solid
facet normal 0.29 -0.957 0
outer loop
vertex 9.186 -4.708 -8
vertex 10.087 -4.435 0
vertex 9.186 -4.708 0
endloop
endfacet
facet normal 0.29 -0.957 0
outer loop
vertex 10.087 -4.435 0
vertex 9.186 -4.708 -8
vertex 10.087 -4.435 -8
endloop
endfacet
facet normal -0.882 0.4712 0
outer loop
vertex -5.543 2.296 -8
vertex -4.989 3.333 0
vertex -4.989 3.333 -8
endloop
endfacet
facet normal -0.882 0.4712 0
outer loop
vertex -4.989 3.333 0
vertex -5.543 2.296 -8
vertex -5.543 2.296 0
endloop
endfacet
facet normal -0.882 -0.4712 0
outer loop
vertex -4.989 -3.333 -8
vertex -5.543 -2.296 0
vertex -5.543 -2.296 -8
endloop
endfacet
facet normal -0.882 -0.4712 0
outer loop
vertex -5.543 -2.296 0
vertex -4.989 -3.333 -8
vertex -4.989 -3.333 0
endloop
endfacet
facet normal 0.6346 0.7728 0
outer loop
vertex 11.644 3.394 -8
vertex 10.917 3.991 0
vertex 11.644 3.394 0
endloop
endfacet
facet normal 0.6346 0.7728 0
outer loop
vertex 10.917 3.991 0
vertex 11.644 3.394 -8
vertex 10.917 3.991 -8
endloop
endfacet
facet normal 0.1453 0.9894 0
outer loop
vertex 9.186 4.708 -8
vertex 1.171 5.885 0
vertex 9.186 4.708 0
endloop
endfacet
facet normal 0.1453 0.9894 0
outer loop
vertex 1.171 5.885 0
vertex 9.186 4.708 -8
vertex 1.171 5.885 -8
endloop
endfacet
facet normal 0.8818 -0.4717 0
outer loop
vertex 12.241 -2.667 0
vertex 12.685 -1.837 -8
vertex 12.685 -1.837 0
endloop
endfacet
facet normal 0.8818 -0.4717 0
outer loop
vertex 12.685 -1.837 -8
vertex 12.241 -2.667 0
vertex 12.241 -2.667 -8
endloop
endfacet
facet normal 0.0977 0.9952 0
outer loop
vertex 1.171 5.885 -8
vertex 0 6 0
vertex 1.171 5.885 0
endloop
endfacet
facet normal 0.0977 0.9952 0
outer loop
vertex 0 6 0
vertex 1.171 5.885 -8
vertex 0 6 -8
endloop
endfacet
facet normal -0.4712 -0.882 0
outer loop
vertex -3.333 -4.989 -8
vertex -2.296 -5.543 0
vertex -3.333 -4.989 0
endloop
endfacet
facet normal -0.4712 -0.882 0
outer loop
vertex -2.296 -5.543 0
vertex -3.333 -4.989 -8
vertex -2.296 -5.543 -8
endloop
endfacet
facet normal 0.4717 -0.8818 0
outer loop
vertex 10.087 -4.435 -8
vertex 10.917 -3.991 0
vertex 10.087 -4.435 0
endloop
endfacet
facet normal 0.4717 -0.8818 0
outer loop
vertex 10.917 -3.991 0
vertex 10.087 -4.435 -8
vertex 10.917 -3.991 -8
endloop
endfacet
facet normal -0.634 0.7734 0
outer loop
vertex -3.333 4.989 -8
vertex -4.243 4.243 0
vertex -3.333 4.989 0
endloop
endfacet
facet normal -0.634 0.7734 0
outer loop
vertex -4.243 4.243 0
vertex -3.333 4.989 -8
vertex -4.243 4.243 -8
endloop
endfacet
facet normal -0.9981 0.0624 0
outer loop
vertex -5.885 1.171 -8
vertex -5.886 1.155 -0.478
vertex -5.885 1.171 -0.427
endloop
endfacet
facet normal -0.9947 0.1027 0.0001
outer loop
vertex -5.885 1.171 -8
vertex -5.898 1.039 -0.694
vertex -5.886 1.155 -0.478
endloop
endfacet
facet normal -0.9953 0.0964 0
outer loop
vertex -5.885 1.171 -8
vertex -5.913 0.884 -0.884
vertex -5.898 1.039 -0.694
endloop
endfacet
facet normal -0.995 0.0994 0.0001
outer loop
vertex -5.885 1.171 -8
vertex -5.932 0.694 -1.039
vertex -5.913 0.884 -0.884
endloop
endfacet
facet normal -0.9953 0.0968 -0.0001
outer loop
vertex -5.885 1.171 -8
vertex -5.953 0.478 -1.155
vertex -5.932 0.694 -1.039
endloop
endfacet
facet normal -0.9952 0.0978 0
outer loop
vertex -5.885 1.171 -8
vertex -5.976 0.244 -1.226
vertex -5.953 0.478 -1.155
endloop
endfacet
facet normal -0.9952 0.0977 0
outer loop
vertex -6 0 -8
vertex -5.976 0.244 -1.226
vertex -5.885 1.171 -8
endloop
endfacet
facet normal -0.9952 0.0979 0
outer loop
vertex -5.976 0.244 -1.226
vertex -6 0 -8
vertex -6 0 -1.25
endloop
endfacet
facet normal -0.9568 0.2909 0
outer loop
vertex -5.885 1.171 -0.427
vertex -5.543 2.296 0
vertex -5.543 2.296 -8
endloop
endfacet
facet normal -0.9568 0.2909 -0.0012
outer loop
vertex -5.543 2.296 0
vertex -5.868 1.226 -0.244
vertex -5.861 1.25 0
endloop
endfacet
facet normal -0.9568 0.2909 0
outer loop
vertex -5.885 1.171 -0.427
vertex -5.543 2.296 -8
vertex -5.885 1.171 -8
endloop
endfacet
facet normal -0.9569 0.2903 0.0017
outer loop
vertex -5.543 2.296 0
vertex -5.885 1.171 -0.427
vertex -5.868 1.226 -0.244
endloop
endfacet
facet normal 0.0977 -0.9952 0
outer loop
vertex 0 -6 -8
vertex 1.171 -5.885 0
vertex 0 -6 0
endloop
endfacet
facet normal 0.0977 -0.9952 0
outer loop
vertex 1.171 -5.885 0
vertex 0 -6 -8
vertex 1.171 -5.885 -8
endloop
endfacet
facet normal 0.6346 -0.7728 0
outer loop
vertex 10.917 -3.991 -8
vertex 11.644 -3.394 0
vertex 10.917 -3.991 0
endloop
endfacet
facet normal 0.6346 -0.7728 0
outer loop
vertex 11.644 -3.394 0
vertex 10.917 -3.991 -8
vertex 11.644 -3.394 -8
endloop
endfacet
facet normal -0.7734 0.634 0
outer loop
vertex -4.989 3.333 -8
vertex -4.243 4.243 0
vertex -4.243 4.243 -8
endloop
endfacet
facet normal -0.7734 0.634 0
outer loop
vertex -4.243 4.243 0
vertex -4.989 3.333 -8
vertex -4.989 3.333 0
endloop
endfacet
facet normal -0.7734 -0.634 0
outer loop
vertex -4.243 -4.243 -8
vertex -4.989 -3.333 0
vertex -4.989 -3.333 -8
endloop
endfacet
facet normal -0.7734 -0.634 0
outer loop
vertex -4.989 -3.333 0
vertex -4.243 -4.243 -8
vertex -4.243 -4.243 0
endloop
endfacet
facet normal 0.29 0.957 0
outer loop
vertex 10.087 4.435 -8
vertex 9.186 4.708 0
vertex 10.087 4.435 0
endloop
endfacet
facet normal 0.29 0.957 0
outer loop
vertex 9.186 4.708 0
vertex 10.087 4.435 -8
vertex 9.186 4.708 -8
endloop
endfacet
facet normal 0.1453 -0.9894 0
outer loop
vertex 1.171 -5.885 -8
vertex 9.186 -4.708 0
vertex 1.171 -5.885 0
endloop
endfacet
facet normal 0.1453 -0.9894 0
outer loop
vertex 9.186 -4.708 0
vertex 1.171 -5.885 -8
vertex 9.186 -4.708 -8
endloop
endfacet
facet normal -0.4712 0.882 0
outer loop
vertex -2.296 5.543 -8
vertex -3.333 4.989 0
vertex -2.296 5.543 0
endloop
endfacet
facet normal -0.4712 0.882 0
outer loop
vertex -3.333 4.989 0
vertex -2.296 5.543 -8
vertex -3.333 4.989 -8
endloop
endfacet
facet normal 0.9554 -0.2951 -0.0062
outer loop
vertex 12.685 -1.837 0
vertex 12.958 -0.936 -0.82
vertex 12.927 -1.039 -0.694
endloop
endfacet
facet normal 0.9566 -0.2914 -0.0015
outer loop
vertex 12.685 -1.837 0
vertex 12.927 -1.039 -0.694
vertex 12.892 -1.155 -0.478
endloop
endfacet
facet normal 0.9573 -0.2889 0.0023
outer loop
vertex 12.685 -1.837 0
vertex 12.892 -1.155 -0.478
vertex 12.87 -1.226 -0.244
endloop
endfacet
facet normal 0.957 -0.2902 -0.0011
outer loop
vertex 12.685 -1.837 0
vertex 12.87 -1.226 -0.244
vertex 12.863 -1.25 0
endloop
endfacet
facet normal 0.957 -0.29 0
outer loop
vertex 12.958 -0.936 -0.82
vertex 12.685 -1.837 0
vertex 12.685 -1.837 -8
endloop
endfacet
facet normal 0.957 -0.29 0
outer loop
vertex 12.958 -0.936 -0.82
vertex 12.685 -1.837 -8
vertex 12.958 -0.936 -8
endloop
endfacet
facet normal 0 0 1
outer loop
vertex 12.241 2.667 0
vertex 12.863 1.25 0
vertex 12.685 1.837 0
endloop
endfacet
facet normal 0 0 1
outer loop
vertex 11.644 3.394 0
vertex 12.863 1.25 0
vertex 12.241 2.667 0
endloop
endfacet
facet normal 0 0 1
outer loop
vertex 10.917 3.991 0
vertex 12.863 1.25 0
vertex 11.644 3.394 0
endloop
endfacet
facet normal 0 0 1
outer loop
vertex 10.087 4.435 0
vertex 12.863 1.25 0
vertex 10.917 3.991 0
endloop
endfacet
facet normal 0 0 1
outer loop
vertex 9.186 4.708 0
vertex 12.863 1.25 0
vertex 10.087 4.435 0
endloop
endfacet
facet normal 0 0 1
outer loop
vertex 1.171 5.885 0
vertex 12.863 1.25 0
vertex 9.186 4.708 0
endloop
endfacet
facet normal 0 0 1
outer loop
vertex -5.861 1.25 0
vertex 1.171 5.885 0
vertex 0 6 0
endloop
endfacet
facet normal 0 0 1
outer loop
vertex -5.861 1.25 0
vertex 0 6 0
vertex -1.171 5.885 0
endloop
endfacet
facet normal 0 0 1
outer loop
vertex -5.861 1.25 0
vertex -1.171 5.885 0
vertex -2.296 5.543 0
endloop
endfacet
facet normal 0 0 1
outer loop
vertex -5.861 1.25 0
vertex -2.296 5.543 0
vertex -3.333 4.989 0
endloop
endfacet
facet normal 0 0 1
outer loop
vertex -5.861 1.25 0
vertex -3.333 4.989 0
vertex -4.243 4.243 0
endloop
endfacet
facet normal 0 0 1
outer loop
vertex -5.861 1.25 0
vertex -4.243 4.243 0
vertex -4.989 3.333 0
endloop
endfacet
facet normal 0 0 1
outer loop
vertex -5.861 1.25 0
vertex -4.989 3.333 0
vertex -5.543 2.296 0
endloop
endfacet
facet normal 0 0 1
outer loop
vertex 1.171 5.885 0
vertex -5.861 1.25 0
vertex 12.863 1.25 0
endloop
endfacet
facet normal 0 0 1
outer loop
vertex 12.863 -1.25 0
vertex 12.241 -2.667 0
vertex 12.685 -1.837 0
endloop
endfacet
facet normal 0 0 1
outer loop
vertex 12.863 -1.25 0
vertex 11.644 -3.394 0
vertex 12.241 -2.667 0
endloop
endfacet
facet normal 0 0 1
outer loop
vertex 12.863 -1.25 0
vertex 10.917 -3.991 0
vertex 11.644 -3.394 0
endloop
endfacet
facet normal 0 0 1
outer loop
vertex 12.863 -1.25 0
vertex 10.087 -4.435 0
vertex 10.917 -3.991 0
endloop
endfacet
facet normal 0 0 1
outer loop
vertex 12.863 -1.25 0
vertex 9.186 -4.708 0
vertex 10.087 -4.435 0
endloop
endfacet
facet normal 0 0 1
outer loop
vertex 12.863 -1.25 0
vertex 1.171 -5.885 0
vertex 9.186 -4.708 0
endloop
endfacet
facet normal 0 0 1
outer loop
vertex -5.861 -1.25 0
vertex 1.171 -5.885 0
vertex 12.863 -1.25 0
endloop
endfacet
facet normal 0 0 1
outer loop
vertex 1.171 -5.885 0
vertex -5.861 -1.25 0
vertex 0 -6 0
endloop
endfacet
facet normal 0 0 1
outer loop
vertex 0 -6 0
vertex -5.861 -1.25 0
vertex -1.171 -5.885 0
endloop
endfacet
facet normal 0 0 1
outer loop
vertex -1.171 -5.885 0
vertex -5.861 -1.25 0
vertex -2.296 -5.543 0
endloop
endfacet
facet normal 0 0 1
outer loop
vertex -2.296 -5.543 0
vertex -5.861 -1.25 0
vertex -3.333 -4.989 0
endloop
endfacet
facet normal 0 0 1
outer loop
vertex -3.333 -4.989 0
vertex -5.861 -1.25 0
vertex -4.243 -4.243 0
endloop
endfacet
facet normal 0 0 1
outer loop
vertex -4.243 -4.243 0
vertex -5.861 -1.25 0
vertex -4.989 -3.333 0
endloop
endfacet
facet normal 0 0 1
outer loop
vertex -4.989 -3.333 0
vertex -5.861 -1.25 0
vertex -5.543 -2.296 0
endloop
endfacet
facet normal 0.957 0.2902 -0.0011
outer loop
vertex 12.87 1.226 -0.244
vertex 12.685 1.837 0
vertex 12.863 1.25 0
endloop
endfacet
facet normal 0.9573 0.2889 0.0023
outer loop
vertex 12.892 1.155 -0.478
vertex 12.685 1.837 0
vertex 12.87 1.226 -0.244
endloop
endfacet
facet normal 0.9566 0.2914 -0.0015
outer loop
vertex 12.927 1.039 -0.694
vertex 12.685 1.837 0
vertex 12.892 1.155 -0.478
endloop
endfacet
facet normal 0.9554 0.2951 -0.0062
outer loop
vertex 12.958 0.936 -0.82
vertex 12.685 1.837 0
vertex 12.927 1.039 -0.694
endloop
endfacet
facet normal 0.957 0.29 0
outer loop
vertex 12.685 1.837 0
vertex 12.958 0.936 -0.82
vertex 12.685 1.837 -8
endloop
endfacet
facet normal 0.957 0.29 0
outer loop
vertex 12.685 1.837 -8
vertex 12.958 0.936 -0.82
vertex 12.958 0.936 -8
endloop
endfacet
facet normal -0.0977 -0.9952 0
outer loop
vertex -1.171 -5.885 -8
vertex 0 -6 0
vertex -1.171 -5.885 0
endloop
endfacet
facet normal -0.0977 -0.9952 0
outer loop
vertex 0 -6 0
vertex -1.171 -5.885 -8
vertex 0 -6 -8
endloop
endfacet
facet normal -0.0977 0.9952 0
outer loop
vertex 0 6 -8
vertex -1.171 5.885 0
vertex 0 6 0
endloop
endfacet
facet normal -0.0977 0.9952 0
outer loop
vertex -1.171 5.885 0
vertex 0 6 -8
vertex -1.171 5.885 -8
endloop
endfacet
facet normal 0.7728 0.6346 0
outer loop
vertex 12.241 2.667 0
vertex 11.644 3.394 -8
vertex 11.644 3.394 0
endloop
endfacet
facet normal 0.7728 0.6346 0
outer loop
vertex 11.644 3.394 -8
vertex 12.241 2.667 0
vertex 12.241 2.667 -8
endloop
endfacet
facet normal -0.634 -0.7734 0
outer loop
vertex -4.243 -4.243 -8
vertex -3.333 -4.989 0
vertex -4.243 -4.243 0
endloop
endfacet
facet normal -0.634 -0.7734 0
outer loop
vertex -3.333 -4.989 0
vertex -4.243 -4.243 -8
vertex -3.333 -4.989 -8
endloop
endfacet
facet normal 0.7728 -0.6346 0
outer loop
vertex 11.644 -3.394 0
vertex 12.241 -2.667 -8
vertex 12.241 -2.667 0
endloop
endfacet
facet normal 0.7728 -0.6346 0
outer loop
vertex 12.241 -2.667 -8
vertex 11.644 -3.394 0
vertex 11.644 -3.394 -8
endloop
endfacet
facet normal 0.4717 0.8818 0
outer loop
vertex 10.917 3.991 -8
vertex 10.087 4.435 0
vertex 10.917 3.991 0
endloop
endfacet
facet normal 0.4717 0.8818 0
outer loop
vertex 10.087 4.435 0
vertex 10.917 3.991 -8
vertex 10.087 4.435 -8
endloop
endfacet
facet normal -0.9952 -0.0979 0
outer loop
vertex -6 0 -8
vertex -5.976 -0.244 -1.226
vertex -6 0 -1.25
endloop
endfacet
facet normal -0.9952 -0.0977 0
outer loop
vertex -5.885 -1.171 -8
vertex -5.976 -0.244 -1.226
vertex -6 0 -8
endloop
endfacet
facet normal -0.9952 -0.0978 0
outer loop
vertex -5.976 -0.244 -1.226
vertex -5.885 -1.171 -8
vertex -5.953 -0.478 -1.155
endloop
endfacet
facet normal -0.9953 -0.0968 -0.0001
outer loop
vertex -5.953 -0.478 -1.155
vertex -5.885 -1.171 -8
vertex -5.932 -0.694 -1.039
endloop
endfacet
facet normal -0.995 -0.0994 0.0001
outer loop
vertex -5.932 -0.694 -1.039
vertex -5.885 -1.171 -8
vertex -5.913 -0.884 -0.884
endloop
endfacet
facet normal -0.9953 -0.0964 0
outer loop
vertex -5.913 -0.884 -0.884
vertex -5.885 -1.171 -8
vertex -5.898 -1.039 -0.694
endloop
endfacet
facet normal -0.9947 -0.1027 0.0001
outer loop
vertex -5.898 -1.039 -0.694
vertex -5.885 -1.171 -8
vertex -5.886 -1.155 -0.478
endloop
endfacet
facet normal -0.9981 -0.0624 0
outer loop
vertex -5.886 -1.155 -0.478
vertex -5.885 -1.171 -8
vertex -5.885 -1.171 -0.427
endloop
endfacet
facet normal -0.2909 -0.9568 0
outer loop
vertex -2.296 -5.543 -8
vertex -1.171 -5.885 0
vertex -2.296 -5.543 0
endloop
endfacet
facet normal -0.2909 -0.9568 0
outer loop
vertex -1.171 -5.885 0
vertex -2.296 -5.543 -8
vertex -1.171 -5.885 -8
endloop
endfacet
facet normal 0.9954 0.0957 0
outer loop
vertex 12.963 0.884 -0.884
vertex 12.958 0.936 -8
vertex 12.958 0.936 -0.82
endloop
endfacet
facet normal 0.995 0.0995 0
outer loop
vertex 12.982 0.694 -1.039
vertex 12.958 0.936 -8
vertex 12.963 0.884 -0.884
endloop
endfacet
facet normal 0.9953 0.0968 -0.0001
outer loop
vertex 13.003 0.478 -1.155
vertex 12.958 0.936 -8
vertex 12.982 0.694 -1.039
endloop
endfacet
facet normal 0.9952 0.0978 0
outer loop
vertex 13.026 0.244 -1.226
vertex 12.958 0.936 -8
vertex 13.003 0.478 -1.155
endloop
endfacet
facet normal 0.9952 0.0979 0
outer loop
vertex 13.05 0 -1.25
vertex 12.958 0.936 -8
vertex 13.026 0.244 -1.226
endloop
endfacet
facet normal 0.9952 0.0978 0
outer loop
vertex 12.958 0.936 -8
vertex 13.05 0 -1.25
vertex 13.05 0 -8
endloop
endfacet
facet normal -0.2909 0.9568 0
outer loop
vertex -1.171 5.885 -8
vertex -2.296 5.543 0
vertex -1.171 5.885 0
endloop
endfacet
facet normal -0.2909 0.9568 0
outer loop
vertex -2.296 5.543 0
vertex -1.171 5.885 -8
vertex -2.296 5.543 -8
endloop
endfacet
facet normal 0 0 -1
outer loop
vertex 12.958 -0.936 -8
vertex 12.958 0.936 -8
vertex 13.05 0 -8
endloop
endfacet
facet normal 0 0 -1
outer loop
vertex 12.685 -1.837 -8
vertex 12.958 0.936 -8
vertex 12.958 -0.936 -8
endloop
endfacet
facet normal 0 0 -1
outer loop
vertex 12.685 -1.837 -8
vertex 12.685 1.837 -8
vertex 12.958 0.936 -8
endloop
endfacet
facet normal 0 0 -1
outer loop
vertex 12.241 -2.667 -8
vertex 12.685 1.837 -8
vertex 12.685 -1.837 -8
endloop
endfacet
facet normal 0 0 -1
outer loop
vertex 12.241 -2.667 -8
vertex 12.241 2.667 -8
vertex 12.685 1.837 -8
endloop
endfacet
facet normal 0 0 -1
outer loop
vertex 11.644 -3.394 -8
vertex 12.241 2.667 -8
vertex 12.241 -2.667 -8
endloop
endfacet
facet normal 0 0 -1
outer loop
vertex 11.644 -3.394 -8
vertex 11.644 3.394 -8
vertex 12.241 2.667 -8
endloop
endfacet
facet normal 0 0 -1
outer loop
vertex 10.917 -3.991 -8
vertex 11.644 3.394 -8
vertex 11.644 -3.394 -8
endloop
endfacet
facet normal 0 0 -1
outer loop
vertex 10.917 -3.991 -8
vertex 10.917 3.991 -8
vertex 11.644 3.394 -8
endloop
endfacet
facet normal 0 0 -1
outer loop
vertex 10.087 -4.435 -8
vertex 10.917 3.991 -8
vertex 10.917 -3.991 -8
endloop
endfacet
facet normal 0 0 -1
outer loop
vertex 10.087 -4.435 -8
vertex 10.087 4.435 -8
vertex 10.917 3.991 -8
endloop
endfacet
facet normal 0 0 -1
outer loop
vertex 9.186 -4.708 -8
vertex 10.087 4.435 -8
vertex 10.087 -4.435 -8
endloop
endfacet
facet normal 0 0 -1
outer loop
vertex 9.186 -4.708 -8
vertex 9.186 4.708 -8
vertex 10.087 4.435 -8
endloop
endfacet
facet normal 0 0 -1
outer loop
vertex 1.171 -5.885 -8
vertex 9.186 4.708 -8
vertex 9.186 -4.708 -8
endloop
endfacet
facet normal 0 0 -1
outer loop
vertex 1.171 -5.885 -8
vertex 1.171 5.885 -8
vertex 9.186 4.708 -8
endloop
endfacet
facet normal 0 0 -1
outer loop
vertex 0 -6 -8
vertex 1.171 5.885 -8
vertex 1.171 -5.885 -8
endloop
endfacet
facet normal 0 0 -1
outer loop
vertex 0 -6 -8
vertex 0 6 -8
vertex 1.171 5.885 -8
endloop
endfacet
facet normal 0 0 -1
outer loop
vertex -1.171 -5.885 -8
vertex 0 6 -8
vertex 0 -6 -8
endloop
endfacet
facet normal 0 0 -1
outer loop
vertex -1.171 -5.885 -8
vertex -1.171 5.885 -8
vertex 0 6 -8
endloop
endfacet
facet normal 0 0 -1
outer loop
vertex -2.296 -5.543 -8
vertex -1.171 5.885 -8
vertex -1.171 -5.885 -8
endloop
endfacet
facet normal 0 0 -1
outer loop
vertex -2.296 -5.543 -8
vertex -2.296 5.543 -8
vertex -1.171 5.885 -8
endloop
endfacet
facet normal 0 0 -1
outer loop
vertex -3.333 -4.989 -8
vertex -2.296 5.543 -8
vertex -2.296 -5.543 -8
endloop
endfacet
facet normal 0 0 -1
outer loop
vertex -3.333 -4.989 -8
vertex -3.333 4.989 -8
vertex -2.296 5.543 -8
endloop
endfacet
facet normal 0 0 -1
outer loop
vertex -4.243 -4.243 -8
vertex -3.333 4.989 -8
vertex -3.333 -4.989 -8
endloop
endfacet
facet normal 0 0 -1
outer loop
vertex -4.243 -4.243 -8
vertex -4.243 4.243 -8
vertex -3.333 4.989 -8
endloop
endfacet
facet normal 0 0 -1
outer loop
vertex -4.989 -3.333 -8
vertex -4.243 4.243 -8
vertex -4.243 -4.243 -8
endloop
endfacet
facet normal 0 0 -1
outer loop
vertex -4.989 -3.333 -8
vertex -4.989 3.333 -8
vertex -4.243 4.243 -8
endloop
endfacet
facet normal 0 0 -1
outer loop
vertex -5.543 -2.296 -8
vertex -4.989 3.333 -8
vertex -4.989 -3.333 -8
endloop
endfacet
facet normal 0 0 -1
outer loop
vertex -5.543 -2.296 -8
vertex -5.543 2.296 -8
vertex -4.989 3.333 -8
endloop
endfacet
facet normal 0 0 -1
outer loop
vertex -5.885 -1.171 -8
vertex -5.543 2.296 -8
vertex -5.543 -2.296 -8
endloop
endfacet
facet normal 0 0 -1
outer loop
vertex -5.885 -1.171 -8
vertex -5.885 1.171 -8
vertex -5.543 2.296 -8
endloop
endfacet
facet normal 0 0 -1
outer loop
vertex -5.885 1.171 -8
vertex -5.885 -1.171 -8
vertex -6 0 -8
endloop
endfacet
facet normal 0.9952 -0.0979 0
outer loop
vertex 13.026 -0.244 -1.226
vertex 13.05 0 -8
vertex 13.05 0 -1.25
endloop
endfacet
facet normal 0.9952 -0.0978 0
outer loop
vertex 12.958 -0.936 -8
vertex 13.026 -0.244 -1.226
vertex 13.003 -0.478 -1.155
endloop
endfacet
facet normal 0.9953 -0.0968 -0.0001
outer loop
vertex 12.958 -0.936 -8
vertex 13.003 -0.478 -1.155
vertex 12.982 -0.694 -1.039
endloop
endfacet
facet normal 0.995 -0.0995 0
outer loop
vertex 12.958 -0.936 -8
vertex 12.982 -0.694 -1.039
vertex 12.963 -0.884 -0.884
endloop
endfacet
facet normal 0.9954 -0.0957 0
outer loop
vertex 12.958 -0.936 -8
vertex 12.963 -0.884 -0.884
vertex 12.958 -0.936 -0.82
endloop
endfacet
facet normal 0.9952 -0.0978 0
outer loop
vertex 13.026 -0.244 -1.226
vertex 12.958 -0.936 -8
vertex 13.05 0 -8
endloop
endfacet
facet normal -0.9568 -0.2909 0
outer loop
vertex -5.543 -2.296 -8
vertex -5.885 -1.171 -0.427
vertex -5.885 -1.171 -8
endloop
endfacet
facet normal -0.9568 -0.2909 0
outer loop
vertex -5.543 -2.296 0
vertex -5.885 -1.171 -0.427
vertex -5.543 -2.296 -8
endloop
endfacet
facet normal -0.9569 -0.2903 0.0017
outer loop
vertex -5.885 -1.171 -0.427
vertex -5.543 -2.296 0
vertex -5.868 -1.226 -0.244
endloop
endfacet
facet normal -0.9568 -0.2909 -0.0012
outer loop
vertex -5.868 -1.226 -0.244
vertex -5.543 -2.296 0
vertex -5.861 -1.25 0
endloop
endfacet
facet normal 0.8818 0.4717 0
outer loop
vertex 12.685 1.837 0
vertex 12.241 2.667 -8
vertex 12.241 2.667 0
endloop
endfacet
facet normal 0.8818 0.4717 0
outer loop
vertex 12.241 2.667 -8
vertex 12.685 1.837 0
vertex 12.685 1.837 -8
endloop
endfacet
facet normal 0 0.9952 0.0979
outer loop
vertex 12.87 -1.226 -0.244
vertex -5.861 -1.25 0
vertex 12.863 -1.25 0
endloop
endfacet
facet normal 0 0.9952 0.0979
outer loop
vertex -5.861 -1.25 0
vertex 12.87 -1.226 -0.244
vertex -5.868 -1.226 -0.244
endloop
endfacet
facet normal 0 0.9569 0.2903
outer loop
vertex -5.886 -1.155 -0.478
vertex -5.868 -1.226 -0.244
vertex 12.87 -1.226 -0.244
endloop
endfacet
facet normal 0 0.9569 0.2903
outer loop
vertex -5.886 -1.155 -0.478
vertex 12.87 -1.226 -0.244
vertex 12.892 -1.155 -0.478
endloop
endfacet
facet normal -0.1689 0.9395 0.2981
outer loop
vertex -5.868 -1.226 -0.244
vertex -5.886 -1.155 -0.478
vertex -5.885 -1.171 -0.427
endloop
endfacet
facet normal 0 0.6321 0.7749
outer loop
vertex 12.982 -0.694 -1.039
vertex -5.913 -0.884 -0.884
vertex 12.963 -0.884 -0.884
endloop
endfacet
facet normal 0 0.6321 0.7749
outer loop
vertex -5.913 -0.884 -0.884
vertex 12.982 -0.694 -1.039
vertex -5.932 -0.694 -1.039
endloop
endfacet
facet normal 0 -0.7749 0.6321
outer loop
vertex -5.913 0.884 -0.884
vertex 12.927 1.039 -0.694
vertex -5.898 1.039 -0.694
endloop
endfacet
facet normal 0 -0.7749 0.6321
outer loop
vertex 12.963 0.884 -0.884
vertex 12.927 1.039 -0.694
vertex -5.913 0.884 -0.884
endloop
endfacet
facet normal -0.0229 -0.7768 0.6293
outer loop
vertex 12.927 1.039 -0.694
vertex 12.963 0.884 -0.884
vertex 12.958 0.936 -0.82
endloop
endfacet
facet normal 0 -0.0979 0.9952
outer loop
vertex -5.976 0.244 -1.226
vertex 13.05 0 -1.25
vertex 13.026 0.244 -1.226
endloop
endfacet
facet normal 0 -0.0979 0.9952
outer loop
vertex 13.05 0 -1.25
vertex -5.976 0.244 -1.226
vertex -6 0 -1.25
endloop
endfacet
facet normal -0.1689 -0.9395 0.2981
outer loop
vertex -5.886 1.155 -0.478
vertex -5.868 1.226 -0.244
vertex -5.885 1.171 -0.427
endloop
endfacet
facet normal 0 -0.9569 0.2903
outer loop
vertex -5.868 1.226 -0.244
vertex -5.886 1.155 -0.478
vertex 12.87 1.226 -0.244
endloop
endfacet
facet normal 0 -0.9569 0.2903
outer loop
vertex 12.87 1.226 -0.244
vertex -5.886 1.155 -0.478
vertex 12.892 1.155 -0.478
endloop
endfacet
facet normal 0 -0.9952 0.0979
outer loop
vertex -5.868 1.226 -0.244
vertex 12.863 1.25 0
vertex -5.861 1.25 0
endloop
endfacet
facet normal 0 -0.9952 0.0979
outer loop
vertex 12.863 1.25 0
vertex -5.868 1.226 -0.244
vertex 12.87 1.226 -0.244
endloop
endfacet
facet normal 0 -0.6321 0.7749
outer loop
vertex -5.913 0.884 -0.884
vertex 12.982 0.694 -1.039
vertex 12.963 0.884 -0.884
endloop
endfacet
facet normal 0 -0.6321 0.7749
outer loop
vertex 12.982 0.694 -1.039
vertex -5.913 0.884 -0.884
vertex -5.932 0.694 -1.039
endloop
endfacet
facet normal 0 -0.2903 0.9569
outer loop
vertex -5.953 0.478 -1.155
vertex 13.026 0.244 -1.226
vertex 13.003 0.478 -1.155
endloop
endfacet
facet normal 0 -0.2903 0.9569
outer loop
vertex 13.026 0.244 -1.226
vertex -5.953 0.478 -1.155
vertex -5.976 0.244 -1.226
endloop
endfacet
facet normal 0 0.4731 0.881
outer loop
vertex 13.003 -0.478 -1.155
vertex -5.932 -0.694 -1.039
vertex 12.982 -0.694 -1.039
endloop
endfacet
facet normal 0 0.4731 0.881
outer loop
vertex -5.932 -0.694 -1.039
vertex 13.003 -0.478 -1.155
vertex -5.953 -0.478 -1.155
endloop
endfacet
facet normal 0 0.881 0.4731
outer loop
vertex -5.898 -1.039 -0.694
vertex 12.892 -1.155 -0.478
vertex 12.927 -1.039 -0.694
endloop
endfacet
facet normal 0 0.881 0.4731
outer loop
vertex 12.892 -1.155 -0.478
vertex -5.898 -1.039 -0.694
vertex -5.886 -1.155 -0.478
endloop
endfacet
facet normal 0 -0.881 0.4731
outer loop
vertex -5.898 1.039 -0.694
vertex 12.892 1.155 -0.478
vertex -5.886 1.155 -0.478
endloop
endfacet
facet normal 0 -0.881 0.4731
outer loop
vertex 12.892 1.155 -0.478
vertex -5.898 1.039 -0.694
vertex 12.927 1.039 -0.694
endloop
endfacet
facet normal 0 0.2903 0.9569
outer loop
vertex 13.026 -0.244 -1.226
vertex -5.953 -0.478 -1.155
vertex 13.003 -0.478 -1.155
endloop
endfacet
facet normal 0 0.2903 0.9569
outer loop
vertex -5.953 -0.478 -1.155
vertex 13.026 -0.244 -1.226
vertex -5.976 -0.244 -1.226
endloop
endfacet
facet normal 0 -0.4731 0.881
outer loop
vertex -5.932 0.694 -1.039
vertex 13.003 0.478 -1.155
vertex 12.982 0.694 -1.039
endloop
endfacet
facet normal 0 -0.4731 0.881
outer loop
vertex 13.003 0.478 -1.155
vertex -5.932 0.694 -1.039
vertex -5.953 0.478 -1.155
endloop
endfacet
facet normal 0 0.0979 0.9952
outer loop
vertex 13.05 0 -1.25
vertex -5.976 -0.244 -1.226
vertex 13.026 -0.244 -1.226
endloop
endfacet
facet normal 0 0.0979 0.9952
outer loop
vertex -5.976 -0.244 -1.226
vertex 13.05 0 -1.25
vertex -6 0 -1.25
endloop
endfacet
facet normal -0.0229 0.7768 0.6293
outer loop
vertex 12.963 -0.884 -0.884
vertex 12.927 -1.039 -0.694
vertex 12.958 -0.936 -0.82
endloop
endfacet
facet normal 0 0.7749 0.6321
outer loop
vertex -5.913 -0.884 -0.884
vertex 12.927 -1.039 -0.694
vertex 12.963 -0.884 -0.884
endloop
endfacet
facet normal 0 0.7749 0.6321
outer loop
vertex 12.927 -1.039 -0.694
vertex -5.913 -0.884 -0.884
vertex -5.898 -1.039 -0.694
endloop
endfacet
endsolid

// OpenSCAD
// COBRA Finger Segment - PROXIMAL
// Length: 8.25mm, Width: 12mm

$fn = 32;

module finger_segment() {
    difference() {
        hull() {
            translate([0, 0, -4])
            cylinder(h=8, d=12, center=true);
            
            translate([8.25, 0, -4])
            cylinder(h=8, d=9.600000000000001, center=true);
        }
        
        // Tendon channel
        translate([4.125, 0, 0])
        rotate([0, 90, 0])
        cylinder(h=10.25, d=2.5, center=true);
        
        // Pivot holes
        translate([0, 0, 0])
        rotate([0, 90, 0])
        cylinder(h=14, d=2.5, center=true);
        
        translate([8.25, 0, 0])
        rotate([0, 90, 0])
        cylinder(h=14, d=2.5, center=true);
    }
}

finger_segment();
